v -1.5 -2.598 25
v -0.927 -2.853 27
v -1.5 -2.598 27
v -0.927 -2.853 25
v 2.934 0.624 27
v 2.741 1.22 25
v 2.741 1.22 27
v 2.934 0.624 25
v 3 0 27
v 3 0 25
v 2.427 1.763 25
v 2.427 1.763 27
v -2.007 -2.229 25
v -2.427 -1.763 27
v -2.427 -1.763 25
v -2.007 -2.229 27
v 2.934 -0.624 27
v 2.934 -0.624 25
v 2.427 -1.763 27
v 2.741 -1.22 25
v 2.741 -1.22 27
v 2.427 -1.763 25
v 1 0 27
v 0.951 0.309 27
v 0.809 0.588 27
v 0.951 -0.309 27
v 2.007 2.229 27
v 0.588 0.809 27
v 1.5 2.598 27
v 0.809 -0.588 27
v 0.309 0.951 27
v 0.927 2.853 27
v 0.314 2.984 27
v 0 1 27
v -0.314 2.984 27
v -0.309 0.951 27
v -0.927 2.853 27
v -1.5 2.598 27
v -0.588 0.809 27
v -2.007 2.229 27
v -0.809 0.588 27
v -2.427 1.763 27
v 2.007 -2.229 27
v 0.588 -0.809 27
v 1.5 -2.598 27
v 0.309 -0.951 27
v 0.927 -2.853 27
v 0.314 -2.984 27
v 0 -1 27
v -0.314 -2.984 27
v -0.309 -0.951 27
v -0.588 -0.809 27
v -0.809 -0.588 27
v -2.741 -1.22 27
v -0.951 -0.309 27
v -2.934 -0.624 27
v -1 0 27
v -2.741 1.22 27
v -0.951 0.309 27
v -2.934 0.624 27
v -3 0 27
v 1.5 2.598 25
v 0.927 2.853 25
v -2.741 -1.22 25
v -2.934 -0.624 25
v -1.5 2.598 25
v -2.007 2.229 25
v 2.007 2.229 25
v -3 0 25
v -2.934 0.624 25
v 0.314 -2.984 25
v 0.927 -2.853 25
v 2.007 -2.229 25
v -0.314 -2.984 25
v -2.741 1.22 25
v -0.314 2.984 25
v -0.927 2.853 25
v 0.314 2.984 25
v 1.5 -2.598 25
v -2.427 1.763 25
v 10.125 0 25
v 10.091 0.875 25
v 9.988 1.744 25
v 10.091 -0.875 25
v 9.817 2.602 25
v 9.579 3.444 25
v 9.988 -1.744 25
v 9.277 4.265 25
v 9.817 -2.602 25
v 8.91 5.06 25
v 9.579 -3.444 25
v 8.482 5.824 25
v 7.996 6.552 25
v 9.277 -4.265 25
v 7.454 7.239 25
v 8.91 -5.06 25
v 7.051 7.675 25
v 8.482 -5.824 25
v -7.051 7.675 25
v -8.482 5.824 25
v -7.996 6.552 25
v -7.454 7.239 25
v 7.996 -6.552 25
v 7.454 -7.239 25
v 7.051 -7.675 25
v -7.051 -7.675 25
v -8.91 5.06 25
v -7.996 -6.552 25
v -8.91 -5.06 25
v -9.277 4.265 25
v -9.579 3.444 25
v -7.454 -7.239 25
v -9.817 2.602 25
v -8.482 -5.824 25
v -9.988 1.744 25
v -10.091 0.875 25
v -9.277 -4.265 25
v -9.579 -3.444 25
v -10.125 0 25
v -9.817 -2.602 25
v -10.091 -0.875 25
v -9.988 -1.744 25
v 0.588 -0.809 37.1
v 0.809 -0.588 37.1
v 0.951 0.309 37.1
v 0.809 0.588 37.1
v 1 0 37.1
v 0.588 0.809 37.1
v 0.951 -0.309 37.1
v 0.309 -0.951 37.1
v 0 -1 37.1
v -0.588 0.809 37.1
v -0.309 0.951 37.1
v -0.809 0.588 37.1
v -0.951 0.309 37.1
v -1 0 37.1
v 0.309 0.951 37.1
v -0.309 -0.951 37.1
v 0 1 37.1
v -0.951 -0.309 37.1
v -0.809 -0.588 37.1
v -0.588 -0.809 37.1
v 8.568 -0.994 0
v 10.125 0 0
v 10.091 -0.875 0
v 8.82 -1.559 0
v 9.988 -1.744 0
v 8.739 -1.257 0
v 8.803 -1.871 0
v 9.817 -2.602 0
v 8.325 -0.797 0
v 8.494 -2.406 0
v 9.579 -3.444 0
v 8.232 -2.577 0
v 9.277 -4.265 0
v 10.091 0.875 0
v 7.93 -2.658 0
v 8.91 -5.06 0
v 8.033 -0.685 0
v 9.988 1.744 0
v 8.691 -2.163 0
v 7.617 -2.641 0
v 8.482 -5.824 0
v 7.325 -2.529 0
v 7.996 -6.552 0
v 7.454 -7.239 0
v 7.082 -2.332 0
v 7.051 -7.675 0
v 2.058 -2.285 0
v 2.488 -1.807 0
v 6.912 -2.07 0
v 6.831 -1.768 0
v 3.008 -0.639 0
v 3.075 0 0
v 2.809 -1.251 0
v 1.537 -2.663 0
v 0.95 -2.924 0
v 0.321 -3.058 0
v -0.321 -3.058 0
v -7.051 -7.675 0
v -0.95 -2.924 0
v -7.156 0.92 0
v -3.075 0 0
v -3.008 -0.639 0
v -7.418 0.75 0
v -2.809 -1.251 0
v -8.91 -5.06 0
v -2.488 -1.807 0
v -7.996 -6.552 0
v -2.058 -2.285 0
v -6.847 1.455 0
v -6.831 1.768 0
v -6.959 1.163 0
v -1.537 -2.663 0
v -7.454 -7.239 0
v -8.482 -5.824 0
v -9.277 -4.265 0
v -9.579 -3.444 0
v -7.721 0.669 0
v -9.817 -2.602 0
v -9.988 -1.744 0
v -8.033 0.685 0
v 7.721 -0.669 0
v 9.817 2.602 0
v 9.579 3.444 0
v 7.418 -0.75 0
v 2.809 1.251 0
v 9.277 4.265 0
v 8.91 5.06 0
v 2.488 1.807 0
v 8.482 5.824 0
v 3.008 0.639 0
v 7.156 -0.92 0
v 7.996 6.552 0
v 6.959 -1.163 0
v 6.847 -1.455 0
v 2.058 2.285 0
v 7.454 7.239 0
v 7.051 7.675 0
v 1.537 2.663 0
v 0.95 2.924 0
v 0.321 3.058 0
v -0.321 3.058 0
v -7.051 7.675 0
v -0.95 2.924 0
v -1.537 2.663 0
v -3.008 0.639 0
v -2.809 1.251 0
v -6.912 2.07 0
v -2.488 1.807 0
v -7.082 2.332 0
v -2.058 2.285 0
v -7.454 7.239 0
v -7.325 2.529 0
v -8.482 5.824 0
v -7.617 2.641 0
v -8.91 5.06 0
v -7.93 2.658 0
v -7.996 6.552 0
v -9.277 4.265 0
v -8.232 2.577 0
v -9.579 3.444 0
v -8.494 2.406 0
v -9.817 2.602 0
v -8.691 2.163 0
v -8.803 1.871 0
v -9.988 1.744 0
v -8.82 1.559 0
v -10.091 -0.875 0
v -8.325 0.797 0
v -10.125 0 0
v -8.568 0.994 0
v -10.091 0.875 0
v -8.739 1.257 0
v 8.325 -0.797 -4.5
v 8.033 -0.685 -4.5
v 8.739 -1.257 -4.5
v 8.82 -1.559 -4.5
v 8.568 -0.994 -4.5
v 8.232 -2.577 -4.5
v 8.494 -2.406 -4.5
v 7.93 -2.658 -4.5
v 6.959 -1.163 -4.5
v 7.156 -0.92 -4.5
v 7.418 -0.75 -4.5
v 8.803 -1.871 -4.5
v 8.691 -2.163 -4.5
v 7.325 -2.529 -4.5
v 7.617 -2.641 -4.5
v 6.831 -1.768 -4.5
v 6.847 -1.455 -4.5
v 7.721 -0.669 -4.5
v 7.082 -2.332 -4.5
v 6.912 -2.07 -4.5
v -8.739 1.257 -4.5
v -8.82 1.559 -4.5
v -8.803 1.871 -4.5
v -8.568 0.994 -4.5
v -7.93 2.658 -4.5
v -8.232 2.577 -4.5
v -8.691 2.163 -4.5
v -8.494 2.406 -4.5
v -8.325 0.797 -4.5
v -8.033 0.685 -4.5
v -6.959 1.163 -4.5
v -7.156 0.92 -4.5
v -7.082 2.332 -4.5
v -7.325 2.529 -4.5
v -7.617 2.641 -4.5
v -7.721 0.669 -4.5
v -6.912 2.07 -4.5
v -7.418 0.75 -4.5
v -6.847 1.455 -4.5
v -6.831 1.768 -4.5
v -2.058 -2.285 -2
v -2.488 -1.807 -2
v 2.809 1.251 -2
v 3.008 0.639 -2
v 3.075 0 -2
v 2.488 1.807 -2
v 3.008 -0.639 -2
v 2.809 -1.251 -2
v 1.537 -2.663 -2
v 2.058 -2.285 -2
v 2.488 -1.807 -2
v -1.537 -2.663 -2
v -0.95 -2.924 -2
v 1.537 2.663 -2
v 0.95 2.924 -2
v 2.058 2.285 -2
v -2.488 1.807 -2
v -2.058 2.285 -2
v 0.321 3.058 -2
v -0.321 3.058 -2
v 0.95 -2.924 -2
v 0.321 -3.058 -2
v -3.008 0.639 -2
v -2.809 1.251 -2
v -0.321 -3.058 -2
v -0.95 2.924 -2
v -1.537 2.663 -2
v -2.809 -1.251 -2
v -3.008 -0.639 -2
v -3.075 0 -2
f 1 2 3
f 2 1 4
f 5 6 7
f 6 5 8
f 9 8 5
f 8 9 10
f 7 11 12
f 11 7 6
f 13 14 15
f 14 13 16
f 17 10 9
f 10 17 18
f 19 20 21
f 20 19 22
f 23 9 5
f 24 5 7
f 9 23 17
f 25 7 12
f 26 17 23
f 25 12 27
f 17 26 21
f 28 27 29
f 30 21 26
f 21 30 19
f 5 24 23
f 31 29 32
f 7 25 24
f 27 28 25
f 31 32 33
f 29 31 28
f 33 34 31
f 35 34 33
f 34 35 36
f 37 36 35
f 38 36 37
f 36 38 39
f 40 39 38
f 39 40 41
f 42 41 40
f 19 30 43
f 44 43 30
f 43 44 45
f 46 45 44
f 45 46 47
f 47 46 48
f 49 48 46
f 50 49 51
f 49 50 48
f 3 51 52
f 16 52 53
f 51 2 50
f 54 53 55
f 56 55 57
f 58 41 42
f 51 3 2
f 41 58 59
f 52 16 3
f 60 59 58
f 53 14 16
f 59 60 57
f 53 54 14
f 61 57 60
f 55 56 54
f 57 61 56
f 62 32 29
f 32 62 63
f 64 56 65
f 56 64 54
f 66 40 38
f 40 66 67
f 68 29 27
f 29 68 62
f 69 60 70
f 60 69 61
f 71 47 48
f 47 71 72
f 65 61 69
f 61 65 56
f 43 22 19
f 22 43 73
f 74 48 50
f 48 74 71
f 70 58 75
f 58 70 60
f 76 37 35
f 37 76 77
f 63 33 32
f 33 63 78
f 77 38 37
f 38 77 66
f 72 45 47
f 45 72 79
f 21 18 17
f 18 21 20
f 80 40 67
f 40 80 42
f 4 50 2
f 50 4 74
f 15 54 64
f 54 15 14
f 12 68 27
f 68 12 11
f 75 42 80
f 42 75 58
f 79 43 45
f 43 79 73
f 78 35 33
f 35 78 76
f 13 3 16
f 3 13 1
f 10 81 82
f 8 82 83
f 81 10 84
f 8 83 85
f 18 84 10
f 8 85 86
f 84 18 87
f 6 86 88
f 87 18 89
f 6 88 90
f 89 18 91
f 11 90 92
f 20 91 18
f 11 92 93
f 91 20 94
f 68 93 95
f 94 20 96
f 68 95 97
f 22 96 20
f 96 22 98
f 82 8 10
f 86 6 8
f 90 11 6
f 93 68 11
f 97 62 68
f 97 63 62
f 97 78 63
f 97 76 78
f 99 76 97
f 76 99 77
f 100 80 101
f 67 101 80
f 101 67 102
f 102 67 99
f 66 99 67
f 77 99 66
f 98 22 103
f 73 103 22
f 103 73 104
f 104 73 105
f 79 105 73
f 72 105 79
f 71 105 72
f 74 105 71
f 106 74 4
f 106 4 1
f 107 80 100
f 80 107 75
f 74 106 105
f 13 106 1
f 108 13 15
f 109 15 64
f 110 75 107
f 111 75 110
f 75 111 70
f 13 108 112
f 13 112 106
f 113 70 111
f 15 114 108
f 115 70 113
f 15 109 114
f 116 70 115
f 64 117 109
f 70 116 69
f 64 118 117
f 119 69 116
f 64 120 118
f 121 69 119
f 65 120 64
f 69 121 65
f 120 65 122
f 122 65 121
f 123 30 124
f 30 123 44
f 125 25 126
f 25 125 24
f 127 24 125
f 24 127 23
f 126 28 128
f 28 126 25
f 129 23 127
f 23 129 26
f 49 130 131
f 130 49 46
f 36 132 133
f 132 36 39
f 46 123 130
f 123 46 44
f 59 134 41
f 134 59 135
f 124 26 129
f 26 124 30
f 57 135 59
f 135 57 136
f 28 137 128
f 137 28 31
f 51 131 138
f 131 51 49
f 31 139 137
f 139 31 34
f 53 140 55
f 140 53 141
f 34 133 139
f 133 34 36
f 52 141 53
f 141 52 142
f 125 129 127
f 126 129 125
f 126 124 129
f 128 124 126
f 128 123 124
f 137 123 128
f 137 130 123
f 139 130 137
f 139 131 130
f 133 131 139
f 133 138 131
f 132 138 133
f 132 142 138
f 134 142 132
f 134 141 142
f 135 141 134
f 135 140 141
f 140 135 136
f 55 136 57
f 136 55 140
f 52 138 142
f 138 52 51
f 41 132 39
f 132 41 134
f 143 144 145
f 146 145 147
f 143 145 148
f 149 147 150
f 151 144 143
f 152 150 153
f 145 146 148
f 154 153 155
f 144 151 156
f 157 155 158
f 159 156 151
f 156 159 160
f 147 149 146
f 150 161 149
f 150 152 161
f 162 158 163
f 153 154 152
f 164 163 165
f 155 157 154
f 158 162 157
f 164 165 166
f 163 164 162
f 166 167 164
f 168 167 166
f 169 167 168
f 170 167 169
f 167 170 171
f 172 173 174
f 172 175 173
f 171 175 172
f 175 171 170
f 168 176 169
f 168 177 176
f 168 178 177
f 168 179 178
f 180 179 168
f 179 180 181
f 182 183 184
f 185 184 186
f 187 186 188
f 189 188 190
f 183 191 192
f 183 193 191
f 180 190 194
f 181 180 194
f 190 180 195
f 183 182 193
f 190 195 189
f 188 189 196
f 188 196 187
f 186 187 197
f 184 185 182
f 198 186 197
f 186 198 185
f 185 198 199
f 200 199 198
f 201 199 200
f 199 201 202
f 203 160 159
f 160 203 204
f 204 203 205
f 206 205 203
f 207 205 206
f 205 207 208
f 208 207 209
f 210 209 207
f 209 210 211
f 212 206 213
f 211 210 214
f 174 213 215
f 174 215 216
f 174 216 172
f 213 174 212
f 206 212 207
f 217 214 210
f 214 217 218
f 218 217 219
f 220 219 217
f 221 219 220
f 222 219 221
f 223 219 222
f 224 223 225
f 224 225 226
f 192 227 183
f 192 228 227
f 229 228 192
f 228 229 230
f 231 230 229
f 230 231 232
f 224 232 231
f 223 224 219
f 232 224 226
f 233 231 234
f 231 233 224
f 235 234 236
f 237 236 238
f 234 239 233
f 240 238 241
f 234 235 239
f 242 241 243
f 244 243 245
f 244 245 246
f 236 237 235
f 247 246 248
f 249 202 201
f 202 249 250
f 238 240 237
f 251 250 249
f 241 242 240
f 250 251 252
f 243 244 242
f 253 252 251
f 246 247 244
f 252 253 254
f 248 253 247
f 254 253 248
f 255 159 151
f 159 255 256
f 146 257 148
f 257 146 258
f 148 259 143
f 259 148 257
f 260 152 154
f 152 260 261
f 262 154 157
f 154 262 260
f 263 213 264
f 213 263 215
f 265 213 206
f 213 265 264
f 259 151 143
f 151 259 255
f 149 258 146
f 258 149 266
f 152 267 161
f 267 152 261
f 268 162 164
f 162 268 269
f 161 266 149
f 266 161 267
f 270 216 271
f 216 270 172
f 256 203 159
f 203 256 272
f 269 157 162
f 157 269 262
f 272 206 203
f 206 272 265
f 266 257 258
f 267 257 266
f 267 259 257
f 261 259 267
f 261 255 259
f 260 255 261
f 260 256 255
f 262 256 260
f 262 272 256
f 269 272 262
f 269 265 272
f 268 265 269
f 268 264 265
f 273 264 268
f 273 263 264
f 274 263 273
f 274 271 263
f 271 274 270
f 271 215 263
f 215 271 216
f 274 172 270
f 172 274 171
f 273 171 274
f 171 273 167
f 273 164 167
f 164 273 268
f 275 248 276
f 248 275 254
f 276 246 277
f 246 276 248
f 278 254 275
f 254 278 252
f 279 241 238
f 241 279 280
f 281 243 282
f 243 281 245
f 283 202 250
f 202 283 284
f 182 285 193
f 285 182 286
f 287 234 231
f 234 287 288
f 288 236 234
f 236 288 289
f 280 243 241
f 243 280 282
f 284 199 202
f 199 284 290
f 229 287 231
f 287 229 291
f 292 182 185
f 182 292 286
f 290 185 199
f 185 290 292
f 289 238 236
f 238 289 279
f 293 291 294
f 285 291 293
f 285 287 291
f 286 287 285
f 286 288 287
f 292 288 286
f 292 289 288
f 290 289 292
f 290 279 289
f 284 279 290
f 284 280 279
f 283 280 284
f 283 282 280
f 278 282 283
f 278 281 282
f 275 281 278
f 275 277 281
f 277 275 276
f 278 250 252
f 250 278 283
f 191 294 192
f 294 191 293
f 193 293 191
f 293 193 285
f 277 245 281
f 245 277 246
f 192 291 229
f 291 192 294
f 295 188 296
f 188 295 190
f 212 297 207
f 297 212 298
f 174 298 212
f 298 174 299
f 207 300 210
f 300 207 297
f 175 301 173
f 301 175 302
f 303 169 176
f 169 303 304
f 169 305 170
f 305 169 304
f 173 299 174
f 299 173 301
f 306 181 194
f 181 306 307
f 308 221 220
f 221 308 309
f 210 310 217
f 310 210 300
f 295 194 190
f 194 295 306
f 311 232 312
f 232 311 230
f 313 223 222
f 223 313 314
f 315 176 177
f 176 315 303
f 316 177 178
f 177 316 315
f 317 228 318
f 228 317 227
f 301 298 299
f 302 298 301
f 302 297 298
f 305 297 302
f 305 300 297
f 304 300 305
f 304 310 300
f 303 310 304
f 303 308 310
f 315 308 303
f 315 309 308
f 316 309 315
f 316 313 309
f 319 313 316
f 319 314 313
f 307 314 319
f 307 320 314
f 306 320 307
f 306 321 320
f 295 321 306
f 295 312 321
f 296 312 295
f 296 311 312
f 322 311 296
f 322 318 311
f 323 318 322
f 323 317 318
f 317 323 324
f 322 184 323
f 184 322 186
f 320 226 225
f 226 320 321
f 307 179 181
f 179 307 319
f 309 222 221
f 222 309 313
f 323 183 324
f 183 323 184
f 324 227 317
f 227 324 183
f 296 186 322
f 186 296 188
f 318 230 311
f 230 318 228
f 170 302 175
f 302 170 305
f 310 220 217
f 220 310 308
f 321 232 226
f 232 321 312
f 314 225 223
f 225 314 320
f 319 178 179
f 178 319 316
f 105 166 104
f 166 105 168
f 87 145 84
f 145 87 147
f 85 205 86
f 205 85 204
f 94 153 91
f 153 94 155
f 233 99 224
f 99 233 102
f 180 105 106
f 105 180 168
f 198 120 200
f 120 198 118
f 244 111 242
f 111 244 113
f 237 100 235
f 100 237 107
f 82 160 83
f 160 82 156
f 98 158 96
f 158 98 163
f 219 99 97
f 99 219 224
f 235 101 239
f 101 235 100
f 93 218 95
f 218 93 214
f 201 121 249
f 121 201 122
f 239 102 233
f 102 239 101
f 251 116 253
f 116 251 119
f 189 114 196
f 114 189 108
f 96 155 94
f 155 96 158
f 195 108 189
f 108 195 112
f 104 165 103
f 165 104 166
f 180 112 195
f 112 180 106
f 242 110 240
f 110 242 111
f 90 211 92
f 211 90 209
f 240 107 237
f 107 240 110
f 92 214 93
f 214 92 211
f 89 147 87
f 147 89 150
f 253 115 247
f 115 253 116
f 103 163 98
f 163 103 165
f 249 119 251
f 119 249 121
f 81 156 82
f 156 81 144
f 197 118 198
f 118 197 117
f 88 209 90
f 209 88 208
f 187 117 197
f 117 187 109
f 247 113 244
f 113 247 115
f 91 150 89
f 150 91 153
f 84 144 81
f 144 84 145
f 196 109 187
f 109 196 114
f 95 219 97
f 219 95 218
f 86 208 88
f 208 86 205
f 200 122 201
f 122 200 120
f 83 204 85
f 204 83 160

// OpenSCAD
// file: ../../fn.scad
// return:
// x - for small values
// some fraction of x (>=16) - for larger values
function fn_preview_(x) = min( max(16, 0.2*x), x );
assert( fn_preview_(10) == 10 );
assert( fn_preview_(16) == 16 );
assert( fn_preview_(90)  > 16 );

// helper functions to define $fn=... to do less precise math
// in a preview mode. example usage:
//   sphere(r=50, $fn=fn(1000));
// would generate $fn=1000 when generating model, but $fn < 1000
// for preview mode. note that for small $fn's value is untouched.
function fn(x) = $preview ? fn_preview_(x) : x;
// file: mt44_conf.scad
// MT44 engine: 12V
// position: shaft pointing up
engine_dc_mt44_box_size = [20.25, 15.35, 25];
engine_dc_mt44_box_top = 14;

// top
engine_dc_mt44_bearing_top_d = 6;
engine_dc_mt44_bearing_top_h = 2;
engine_dc_mt44_shaft_h = 10.1;
engine_dc_mt44_shaft_d = 2;

// bottom
engine_dc_mt44_bearing_bottom_d = 6.15;
engine_dc_mt44_bearing_bottom_h = 2;
engine_dc_mt44_lead_pos_r = 8;
engine_dc_mt44_lead_pos_angle = 12; // [deg]
engine_dc_mt44_lead_d = 2;
engine_dc_mt44_lead_h = 4.5;
// main file
// MT44 DC motor
// 12V
// 0.6A max
include<mt44_conf.scad>
use<../../fn.scad>


module engine_dc_mt44_crosssection_2d()
{
  q = engine_dc_mt44_box_top;
  Q = engine_dc_mt44_box_size.x/2;
  h = engine_dc_mt44_box_size.y/2;
  B = [Q, 0];
  C = [Q-q, h];
  Dx = ( pow(C.x,2) + pow(C.y, 2) - pow(B.x, 2) - pow(B.y, 2) ) / ( 2*(C.x - B.x) );
  echo(Dx);
  R = Q + Dx;

  intersection()
  {
    translate([Dx, 0, 0])
      circle(r=R);
    translate([-Dx, 0, 0])
      circle(r=R);
    square([engine_dc_mt44_box_size.x, engine_dc_mt44_box_size.y], center=true);
  }
}


module engine_dc_mt44()
{
  module body()
  {
    linear_extrude(engine_dc_mt44_box_size.z)
      engine_dc_mt44_crosssection_2d($fn=fn(80));
  }

  module top()
  {
    cylinder(d=engine_dc_mt44_bearing_top_d, h=engine_dc_mt44_bearing_top_h, $fn=fn(30));
    translate([0, 0, engine_dc_mt44_bearing_top_h])
      cylinder(d=engine_dc_mt44_shaft_d, h=engine_dc_mt44_shaft_h, $fn=fn(20));
  }

  module bottom()
  {
    translate([0, 0, -engine_dc_mt44_bearing_bottom_h])
      cylinder(d=engine_dc_mt44_bearing_bottom_d, h=engine_dc_mt44_bearing_bottom_h, $fn=fn(30));
    for(dr=[0, 180])
      rotate(-[0, 0, engine_dc_mt44_lead_pos_angle + dr])
        translate([engine_dc_mt44_lead_pos_r, 0, -engine_dc_mt44_lead_h])
          cylinder(d=engine_dc_mt44_lead_d, h=engine_dc_mt44_lead_h, $fn=fn(20));
  }

  body();
  translate([0, 0, engine_dc_mt44_box_size.z])
    top();
  bottom();
}


engine_dc_mt44();
